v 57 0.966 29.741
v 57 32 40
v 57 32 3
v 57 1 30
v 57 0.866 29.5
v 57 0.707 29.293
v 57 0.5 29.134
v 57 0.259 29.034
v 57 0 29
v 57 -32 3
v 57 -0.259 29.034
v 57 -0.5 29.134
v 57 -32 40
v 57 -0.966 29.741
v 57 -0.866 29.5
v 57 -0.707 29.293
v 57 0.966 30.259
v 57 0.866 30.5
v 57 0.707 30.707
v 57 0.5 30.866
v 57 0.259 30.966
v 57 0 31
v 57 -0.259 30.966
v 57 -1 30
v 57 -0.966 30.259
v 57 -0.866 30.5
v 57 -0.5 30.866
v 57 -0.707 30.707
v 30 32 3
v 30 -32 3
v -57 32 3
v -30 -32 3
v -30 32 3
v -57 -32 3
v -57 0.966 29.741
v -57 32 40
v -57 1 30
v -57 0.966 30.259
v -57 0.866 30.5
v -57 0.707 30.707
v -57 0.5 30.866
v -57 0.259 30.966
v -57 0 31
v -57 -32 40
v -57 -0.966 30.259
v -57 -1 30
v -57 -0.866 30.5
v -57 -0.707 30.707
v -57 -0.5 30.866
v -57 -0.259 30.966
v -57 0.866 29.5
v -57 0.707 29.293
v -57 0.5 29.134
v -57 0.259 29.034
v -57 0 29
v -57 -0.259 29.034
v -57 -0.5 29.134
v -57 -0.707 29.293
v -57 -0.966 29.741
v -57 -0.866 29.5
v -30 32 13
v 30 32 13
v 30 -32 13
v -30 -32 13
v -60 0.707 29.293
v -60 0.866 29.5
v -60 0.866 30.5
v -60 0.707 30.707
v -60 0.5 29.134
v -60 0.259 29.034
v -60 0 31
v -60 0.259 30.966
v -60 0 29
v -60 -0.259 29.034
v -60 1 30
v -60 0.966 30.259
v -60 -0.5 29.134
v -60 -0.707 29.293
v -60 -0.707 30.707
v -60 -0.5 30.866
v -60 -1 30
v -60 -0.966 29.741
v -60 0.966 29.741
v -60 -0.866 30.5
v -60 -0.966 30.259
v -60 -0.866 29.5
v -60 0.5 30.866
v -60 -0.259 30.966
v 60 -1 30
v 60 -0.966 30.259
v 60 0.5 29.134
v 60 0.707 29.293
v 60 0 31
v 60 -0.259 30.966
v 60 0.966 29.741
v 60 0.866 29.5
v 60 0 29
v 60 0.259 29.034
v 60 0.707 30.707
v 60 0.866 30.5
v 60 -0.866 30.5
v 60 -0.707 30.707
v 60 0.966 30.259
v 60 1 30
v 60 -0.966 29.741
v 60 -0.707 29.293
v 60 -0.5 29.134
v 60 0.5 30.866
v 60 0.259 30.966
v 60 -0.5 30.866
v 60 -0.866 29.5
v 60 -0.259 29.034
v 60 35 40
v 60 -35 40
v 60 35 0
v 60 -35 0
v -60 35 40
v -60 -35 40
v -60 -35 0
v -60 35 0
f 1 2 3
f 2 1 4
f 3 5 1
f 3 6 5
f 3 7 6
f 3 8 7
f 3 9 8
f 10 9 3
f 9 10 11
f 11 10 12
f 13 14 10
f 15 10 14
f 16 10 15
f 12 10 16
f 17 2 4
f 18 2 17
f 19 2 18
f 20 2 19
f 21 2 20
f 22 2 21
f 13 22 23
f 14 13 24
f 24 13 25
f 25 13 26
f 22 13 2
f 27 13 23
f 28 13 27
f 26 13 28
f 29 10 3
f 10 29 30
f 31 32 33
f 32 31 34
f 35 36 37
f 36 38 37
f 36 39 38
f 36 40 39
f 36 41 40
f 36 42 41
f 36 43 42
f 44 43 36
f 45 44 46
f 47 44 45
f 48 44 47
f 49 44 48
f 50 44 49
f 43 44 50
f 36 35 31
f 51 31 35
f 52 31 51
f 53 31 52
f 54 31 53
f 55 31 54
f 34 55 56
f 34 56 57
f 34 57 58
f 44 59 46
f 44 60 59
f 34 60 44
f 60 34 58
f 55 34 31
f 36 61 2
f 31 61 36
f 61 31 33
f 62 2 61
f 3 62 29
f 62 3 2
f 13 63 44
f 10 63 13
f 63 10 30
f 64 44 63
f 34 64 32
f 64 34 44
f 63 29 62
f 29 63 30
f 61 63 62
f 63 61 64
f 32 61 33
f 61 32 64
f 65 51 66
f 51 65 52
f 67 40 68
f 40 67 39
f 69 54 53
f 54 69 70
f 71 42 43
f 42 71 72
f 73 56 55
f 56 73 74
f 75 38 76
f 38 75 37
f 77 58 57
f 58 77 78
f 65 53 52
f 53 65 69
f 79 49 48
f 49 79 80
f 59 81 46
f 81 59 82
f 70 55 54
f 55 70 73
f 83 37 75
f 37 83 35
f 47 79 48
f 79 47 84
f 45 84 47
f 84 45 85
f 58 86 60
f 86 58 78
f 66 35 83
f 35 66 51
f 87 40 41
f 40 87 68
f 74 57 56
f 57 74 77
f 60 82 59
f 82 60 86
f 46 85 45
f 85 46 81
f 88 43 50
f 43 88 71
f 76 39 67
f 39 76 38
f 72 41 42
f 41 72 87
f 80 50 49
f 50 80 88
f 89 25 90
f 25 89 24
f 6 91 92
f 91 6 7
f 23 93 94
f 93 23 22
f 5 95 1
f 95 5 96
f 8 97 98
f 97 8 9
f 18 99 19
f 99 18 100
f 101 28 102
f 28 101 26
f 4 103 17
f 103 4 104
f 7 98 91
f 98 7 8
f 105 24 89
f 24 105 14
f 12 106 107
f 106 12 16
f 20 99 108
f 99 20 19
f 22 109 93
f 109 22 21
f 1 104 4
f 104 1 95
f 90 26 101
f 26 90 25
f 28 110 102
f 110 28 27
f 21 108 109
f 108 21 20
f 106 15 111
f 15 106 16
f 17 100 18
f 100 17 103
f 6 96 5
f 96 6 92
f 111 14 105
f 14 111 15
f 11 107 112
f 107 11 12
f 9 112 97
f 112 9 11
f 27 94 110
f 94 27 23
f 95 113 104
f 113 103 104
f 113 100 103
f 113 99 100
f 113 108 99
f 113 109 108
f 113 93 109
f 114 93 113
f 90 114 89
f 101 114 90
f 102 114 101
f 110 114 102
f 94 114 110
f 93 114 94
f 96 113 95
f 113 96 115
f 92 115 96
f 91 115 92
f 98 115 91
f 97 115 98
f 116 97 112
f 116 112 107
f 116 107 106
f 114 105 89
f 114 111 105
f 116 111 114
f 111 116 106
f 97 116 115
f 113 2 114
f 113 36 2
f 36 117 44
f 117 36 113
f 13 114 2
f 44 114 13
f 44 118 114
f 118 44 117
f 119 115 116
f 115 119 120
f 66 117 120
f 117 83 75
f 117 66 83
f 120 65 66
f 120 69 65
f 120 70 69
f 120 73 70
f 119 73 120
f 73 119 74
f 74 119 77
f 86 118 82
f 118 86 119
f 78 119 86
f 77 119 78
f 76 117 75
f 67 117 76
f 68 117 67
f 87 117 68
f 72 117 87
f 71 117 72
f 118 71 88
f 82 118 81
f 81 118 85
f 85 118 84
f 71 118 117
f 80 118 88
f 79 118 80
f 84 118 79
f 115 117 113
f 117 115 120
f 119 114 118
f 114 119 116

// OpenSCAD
// Buffer tank for a mini horizontal gel-electrophoresis box
// Category: full hardware. Raised gel platform between two buffer chambers and
// 2 mm holes for platinum/stainless electrode wires.
// Print: PETG, 0.2 mm layers, 4+ perimeters; leak-test with water before use.
// SAFETY: electrophoresis runs at ~50-150 V DC - a closed lid with an interlock and
// a proper power supply are required. Never run it open.
// SPDX-License-Identifier: CERN-OHL-P-2.0

/* [Tank] */
outer = [120, 70, 40]; // X, Y, Z
wall = 3;
floor_t = 3;
platform_len = 60;     // along X, centred
platform_h = 10;       // above the inner floor
wire_d = 2;
wire_z = 30;

/* [Hidden] */
eps = 0.01;

difference() {
    translate([-outer.x / 2, -outer.y / 2, 0]) cube(outer);
    difference() {
        translate([-outer.x / 2 + wall, -outer.y / 2 + wall, floor_t])
            cube([outer.x - 2 * wall, outer.y - 2 * wall, outer.z]);
        translate([-platform_len / 2, -outer.y / 2, 0])
            cube([platform_len, outer.y, floor_t + platform_h]);
    }
    for (sx = [-1, 1])
        translate([sx * (outer.x / 2 - wall / 2), 0, wire_z])
            rotate([0, 90, 0]) cylinder(d = wire_d, h = wall + 2, center = true, $fn = 24);
}
